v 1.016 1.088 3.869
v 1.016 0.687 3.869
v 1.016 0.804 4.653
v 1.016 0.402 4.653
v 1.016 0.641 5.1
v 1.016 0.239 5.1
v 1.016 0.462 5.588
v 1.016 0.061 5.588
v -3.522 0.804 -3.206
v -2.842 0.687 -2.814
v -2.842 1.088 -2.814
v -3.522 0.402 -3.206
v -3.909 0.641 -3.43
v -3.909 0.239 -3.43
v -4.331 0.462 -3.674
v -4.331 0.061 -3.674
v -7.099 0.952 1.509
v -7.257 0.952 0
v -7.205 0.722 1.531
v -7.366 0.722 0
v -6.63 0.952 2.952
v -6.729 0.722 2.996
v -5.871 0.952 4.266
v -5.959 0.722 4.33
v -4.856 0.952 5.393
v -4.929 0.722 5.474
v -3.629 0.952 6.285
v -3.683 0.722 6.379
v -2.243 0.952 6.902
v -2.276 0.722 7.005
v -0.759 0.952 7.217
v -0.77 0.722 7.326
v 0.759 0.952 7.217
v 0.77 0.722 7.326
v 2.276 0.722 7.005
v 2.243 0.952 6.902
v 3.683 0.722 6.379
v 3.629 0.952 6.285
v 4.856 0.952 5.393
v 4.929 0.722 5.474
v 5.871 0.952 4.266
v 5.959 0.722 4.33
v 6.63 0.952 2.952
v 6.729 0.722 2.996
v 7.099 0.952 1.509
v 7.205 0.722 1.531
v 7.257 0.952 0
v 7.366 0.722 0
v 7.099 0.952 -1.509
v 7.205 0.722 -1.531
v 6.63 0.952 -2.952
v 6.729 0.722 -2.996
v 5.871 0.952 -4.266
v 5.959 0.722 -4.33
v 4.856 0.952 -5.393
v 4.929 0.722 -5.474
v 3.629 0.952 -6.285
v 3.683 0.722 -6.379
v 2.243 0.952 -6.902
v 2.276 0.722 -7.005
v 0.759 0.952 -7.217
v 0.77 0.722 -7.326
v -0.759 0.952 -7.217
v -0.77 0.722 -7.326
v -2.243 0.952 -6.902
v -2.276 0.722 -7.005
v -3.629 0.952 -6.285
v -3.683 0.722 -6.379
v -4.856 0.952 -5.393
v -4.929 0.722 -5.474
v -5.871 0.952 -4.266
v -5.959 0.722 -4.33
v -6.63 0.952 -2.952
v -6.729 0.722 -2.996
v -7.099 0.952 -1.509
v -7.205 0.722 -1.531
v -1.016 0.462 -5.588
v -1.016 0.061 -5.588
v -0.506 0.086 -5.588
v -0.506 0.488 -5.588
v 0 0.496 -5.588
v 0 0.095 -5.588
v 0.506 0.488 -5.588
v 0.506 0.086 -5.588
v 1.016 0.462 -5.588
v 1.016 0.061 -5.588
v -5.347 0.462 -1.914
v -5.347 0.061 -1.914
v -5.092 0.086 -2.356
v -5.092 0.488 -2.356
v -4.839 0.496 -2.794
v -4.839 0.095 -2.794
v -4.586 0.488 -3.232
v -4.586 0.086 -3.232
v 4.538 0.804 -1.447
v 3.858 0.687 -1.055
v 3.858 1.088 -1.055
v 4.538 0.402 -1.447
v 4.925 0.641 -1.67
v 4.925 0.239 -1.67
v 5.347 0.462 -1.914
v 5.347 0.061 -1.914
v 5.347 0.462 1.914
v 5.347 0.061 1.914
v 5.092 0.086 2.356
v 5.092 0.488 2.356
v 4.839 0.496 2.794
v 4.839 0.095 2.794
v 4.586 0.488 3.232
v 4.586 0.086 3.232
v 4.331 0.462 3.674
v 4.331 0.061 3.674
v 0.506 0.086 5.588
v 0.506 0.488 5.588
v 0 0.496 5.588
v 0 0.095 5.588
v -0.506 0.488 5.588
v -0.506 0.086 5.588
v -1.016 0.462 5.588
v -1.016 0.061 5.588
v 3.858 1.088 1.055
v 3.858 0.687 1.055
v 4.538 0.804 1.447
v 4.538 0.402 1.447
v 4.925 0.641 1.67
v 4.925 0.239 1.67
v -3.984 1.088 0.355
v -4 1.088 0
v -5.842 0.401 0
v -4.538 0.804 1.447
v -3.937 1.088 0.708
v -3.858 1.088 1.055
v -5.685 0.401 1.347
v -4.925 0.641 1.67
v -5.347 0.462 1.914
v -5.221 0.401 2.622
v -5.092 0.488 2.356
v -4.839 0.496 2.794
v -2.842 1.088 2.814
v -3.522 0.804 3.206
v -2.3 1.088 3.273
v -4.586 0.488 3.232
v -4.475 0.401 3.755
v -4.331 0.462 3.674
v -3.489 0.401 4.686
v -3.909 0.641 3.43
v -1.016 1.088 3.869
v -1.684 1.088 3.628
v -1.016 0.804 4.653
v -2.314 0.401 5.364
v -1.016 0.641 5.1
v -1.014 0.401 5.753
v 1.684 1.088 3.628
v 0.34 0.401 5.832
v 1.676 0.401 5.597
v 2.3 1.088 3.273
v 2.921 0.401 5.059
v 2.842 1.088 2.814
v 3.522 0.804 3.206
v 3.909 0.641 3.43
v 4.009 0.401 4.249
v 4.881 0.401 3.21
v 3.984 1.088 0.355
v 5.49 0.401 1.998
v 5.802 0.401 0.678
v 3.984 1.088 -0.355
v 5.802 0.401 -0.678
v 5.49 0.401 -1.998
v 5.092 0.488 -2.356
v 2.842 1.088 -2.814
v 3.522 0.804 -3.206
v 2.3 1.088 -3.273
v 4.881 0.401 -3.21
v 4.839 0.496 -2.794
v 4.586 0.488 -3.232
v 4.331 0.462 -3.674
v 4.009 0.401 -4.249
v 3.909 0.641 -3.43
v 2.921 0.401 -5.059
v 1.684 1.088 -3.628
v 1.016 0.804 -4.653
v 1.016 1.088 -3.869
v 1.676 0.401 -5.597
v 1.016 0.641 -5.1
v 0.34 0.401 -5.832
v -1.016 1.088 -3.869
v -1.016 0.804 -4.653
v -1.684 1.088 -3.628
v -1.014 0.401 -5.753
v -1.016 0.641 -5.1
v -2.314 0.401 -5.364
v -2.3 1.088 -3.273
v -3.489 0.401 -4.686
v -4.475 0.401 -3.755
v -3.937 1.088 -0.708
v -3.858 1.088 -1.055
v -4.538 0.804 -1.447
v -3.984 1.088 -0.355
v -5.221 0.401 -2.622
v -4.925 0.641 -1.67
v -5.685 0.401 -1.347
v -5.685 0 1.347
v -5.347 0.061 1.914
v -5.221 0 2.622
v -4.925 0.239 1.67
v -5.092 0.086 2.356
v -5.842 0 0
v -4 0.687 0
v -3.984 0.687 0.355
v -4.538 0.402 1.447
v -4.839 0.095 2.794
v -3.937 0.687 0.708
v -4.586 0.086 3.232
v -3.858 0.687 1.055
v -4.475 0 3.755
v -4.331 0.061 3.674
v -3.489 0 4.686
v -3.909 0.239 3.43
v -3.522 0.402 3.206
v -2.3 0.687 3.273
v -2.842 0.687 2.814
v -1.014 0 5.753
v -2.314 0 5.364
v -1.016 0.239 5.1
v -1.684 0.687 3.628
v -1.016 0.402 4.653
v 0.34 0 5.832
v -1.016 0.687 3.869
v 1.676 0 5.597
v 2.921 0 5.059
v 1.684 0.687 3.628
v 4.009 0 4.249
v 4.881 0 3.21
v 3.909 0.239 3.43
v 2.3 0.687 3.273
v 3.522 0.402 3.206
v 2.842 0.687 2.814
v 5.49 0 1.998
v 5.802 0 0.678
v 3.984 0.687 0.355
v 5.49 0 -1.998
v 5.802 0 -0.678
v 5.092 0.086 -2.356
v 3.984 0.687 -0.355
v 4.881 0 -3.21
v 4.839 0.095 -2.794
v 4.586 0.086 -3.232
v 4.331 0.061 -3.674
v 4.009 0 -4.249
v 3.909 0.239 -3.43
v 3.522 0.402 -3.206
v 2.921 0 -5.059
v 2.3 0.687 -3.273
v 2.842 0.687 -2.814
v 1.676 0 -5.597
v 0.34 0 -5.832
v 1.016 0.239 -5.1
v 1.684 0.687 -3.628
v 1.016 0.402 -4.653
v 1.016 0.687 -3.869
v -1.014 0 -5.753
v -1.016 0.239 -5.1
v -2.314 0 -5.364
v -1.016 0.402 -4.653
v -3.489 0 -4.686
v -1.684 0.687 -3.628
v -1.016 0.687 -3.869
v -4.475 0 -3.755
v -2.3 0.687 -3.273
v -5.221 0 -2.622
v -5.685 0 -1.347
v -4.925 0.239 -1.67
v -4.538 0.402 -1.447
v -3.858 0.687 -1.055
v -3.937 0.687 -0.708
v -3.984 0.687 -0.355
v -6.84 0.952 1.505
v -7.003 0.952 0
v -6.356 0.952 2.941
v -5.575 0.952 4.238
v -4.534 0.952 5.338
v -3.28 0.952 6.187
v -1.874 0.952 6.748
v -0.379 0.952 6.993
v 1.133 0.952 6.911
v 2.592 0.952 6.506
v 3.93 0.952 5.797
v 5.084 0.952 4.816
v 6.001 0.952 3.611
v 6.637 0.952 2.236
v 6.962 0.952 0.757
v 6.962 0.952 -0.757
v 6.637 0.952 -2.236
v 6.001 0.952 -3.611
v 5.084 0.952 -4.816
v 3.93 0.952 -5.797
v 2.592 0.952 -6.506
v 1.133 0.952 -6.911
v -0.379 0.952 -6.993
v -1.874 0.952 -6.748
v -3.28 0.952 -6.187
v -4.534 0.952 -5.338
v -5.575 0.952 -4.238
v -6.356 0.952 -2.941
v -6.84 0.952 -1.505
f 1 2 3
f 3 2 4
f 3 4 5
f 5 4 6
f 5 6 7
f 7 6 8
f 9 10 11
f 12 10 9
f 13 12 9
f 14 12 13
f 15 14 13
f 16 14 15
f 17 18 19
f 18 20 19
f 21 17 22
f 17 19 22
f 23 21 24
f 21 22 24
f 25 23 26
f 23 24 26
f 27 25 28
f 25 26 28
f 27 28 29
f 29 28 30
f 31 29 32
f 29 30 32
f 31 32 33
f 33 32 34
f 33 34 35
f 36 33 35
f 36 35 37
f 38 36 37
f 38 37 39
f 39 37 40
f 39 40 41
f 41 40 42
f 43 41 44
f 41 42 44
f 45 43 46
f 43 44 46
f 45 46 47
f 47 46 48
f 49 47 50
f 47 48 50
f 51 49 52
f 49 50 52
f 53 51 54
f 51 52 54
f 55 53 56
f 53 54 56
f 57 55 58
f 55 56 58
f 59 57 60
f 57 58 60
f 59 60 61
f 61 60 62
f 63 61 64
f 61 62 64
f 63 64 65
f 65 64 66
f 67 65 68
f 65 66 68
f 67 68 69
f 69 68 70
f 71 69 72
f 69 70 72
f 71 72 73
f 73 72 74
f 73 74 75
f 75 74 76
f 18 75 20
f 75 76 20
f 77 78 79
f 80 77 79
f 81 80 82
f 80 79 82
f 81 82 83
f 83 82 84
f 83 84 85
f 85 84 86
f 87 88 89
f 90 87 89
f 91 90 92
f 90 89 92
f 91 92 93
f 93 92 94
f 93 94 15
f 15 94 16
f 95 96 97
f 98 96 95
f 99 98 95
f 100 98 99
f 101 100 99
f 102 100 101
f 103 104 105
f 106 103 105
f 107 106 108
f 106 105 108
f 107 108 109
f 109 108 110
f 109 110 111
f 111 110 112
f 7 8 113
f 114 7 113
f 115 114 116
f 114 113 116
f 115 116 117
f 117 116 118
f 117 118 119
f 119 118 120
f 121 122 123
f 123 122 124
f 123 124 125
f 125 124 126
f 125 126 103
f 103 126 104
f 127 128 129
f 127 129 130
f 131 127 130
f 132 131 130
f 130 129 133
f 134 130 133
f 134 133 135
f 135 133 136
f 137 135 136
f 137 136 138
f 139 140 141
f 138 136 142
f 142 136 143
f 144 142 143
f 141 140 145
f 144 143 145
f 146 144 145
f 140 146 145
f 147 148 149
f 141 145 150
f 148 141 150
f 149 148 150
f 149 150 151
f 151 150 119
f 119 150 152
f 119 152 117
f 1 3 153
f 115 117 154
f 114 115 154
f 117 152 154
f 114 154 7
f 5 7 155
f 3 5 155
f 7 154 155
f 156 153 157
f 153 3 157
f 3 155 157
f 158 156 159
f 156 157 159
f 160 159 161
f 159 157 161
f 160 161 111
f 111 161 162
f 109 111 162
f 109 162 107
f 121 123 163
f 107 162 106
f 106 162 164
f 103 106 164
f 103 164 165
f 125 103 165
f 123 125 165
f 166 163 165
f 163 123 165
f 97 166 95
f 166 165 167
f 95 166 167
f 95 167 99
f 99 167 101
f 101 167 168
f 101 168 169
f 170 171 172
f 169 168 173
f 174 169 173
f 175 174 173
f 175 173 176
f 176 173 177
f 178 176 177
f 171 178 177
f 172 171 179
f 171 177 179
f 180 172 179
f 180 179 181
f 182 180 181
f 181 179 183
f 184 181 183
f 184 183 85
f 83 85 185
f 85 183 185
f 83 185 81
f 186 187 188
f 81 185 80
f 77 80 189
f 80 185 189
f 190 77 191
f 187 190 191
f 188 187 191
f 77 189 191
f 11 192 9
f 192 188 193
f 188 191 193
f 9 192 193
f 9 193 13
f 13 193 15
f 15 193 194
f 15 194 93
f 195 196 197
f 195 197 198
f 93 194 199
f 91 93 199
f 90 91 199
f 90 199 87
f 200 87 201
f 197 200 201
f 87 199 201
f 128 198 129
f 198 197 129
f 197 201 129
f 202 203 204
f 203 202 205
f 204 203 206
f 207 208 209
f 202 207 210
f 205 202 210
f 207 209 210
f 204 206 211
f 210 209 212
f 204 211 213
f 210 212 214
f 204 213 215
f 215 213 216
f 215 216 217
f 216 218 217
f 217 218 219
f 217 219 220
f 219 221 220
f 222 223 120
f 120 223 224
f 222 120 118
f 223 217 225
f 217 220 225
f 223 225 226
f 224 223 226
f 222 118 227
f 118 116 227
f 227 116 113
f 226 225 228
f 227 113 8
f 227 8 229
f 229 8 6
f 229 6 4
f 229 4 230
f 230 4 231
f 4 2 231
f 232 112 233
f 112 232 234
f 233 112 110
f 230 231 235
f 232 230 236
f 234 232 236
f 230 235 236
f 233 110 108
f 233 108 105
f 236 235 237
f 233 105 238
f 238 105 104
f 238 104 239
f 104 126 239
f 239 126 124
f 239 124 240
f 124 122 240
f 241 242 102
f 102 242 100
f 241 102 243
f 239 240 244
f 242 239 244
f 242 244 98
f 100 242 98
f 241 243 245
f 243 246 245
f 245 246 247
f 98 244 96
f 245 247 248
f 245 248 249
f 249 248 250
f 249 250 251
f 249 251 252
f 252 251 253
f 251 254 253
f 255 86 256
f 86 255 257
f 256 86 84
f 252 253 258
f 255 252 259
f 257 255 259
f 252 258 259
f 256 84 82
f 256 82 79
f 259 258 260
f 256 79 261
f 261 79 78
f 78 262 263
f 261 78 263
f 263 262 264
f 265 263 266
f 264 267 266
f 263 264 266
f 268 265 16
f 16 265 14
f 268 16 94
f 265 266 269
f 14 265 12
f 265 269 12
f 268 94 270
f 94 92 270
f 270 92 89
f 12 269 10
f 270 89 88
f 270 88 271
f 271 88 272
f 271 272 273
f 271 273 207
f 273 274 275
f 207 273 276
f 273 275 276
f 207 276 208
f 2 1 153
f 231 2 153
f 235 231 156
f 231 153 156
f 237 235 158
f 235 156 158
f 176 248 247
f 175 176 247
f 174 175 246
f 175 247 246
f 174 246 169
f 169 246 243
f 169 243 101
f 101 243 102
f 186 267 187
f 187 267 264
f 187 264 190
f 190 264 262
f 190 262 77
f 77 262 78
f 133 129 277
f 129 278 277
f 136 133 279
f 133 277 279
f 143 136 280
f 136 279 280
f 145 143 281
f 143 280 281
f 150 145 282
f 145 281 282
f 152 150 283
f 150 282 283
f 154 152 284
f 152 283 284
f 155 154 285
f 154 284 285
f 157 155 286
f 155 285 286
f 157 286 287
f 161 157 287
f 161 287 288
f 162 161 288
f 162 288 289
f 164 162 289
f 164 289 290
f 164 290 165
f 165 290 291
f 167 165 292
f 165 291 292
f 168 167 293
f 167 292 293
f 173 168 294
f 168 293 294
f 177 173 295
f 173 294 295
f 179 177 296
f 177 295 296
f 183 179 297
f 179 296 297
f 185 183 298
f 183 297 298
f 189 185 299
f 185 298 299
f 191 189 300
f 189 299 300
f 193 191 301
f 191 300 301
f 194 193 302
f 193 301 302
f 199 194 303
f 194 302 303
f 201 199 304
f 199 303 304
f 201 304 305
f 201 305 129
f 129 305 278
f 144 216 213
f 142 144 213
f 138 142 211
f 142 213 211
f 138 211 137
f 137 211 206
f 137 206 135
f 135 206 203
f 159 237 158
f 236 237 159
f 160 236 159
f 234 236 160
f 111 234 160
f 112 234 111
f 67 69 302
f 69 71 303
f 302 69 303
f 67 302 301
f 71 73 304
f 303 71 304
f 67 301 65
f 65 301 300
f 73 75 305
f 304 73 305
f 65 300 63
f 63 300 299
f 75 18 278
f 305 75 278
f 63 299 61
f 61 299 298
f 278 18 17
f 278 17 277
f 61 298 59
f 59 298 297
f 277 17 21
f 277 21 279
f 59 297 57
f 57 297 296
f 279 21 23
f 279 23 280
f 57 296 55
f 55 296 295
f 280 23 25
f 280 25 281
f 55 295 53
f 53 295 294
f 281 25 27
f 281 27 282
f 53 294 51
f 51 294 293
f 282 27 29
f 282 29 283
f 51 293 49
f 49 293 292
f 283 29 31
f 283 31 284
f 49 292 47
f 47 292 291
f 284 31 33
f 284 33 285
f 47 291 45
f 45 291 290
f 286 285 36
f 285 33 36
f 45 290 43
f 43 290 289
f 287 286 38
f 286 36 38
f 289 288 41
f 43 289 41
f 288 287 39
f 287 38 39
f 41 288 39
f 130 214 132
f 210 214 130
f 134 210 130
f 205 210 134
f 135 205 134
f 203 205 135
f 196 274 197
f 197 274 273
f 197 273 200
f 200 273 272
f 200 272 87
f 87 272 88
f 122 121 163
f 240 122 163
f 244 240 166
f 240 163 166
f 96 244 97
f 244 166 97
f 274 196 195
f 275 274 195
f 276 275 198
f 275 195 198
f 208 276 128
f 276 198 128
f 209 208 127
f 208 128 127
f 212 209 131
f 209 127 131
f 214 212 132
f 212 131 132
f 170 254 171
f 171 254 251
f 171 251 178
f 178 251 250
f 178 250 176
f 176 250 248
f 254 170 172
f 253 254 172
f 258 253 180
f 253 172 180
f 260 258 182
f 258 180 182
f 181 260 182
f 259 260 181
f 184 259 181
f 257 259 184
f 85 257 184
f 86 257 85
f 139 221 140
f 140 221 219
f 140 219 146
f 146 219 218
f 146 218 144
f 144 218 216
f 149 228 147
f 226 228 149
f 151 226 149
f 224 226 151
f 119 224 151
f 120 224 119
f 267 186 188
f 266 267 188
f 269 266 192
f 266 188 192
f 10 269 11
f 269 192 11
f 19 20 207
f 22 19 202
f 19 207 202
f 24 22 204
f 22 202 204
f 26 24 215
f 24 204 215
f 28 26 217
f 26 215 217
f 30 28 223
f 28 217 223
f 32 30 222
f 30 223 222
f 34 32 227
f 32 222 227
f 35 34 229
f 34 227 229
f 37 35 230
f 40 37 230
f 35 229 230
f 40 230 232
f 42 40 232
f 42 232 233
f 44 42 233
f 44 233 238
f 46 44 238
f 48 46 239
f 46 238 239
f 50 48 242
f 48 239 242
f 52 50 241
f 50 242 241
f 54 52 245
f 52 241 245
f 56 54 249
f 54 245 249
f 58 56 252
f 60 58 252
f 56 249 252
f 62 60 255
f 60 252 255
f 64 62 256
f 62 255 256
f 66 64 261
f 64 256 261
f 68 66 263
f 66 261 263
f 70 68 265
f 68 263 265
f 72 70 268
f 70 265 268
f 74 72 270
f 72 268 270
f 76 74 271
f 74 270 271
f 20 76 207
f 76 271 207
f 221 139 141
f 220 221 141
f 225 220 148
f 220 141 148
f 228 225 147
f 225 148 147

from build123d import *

# Parameters (mm, degrees)
SKETCH3_W         = 2.032
SKETCH3_H         = 5.588
EXTRUDE1_DEPTH    = 11.473781034
CIRPATTERN1_COUNT = 6


with BuildPart() as part:
    # Sketch2 → Revolve1 (revolve)
    with BuildSketch(Plane.XY):
        Polygon((-4, 1.088262662), (-5.8419953, 0.40140039), (-7.003246048, 0.951561432), (-7.257246048, 0.951561432), (-7.3659953, 0.722019279), (-5.8419953, 0), (-4, 0.686862271), align=None)
    revolve(axis=Axis((0, 0, 0), (0, 1, 0)))

    # Sketch3 → Extrude1 (cut, through all)
    with BuildSketch(Plane(origin=(0, 0, 0), x_dir=(1, 0, 0), z_dir=(0, 1, 0))):
        with Locations((0, 2.794)):
            Rectangle(SKETCH3_W, SKETCH3_H)
    extrude1 = extrude(amount=EXTRUDE1_DEPTH, mode=Mode.SUBTRACT)

    # CirPattern1: Extrude1 ×6 about axis
    cirpattern1_axis = Axis((0, 1.088262662, 0), (0, -1, 0))
    for i in range(1, CIRPATTERN1_COUNT):
        add(extrude1.rotate(cirpattern1_axis, i * 360 / CIRPATTERN1_COUNT), mode=Mode.SUBTRACT)


solid = part.part
